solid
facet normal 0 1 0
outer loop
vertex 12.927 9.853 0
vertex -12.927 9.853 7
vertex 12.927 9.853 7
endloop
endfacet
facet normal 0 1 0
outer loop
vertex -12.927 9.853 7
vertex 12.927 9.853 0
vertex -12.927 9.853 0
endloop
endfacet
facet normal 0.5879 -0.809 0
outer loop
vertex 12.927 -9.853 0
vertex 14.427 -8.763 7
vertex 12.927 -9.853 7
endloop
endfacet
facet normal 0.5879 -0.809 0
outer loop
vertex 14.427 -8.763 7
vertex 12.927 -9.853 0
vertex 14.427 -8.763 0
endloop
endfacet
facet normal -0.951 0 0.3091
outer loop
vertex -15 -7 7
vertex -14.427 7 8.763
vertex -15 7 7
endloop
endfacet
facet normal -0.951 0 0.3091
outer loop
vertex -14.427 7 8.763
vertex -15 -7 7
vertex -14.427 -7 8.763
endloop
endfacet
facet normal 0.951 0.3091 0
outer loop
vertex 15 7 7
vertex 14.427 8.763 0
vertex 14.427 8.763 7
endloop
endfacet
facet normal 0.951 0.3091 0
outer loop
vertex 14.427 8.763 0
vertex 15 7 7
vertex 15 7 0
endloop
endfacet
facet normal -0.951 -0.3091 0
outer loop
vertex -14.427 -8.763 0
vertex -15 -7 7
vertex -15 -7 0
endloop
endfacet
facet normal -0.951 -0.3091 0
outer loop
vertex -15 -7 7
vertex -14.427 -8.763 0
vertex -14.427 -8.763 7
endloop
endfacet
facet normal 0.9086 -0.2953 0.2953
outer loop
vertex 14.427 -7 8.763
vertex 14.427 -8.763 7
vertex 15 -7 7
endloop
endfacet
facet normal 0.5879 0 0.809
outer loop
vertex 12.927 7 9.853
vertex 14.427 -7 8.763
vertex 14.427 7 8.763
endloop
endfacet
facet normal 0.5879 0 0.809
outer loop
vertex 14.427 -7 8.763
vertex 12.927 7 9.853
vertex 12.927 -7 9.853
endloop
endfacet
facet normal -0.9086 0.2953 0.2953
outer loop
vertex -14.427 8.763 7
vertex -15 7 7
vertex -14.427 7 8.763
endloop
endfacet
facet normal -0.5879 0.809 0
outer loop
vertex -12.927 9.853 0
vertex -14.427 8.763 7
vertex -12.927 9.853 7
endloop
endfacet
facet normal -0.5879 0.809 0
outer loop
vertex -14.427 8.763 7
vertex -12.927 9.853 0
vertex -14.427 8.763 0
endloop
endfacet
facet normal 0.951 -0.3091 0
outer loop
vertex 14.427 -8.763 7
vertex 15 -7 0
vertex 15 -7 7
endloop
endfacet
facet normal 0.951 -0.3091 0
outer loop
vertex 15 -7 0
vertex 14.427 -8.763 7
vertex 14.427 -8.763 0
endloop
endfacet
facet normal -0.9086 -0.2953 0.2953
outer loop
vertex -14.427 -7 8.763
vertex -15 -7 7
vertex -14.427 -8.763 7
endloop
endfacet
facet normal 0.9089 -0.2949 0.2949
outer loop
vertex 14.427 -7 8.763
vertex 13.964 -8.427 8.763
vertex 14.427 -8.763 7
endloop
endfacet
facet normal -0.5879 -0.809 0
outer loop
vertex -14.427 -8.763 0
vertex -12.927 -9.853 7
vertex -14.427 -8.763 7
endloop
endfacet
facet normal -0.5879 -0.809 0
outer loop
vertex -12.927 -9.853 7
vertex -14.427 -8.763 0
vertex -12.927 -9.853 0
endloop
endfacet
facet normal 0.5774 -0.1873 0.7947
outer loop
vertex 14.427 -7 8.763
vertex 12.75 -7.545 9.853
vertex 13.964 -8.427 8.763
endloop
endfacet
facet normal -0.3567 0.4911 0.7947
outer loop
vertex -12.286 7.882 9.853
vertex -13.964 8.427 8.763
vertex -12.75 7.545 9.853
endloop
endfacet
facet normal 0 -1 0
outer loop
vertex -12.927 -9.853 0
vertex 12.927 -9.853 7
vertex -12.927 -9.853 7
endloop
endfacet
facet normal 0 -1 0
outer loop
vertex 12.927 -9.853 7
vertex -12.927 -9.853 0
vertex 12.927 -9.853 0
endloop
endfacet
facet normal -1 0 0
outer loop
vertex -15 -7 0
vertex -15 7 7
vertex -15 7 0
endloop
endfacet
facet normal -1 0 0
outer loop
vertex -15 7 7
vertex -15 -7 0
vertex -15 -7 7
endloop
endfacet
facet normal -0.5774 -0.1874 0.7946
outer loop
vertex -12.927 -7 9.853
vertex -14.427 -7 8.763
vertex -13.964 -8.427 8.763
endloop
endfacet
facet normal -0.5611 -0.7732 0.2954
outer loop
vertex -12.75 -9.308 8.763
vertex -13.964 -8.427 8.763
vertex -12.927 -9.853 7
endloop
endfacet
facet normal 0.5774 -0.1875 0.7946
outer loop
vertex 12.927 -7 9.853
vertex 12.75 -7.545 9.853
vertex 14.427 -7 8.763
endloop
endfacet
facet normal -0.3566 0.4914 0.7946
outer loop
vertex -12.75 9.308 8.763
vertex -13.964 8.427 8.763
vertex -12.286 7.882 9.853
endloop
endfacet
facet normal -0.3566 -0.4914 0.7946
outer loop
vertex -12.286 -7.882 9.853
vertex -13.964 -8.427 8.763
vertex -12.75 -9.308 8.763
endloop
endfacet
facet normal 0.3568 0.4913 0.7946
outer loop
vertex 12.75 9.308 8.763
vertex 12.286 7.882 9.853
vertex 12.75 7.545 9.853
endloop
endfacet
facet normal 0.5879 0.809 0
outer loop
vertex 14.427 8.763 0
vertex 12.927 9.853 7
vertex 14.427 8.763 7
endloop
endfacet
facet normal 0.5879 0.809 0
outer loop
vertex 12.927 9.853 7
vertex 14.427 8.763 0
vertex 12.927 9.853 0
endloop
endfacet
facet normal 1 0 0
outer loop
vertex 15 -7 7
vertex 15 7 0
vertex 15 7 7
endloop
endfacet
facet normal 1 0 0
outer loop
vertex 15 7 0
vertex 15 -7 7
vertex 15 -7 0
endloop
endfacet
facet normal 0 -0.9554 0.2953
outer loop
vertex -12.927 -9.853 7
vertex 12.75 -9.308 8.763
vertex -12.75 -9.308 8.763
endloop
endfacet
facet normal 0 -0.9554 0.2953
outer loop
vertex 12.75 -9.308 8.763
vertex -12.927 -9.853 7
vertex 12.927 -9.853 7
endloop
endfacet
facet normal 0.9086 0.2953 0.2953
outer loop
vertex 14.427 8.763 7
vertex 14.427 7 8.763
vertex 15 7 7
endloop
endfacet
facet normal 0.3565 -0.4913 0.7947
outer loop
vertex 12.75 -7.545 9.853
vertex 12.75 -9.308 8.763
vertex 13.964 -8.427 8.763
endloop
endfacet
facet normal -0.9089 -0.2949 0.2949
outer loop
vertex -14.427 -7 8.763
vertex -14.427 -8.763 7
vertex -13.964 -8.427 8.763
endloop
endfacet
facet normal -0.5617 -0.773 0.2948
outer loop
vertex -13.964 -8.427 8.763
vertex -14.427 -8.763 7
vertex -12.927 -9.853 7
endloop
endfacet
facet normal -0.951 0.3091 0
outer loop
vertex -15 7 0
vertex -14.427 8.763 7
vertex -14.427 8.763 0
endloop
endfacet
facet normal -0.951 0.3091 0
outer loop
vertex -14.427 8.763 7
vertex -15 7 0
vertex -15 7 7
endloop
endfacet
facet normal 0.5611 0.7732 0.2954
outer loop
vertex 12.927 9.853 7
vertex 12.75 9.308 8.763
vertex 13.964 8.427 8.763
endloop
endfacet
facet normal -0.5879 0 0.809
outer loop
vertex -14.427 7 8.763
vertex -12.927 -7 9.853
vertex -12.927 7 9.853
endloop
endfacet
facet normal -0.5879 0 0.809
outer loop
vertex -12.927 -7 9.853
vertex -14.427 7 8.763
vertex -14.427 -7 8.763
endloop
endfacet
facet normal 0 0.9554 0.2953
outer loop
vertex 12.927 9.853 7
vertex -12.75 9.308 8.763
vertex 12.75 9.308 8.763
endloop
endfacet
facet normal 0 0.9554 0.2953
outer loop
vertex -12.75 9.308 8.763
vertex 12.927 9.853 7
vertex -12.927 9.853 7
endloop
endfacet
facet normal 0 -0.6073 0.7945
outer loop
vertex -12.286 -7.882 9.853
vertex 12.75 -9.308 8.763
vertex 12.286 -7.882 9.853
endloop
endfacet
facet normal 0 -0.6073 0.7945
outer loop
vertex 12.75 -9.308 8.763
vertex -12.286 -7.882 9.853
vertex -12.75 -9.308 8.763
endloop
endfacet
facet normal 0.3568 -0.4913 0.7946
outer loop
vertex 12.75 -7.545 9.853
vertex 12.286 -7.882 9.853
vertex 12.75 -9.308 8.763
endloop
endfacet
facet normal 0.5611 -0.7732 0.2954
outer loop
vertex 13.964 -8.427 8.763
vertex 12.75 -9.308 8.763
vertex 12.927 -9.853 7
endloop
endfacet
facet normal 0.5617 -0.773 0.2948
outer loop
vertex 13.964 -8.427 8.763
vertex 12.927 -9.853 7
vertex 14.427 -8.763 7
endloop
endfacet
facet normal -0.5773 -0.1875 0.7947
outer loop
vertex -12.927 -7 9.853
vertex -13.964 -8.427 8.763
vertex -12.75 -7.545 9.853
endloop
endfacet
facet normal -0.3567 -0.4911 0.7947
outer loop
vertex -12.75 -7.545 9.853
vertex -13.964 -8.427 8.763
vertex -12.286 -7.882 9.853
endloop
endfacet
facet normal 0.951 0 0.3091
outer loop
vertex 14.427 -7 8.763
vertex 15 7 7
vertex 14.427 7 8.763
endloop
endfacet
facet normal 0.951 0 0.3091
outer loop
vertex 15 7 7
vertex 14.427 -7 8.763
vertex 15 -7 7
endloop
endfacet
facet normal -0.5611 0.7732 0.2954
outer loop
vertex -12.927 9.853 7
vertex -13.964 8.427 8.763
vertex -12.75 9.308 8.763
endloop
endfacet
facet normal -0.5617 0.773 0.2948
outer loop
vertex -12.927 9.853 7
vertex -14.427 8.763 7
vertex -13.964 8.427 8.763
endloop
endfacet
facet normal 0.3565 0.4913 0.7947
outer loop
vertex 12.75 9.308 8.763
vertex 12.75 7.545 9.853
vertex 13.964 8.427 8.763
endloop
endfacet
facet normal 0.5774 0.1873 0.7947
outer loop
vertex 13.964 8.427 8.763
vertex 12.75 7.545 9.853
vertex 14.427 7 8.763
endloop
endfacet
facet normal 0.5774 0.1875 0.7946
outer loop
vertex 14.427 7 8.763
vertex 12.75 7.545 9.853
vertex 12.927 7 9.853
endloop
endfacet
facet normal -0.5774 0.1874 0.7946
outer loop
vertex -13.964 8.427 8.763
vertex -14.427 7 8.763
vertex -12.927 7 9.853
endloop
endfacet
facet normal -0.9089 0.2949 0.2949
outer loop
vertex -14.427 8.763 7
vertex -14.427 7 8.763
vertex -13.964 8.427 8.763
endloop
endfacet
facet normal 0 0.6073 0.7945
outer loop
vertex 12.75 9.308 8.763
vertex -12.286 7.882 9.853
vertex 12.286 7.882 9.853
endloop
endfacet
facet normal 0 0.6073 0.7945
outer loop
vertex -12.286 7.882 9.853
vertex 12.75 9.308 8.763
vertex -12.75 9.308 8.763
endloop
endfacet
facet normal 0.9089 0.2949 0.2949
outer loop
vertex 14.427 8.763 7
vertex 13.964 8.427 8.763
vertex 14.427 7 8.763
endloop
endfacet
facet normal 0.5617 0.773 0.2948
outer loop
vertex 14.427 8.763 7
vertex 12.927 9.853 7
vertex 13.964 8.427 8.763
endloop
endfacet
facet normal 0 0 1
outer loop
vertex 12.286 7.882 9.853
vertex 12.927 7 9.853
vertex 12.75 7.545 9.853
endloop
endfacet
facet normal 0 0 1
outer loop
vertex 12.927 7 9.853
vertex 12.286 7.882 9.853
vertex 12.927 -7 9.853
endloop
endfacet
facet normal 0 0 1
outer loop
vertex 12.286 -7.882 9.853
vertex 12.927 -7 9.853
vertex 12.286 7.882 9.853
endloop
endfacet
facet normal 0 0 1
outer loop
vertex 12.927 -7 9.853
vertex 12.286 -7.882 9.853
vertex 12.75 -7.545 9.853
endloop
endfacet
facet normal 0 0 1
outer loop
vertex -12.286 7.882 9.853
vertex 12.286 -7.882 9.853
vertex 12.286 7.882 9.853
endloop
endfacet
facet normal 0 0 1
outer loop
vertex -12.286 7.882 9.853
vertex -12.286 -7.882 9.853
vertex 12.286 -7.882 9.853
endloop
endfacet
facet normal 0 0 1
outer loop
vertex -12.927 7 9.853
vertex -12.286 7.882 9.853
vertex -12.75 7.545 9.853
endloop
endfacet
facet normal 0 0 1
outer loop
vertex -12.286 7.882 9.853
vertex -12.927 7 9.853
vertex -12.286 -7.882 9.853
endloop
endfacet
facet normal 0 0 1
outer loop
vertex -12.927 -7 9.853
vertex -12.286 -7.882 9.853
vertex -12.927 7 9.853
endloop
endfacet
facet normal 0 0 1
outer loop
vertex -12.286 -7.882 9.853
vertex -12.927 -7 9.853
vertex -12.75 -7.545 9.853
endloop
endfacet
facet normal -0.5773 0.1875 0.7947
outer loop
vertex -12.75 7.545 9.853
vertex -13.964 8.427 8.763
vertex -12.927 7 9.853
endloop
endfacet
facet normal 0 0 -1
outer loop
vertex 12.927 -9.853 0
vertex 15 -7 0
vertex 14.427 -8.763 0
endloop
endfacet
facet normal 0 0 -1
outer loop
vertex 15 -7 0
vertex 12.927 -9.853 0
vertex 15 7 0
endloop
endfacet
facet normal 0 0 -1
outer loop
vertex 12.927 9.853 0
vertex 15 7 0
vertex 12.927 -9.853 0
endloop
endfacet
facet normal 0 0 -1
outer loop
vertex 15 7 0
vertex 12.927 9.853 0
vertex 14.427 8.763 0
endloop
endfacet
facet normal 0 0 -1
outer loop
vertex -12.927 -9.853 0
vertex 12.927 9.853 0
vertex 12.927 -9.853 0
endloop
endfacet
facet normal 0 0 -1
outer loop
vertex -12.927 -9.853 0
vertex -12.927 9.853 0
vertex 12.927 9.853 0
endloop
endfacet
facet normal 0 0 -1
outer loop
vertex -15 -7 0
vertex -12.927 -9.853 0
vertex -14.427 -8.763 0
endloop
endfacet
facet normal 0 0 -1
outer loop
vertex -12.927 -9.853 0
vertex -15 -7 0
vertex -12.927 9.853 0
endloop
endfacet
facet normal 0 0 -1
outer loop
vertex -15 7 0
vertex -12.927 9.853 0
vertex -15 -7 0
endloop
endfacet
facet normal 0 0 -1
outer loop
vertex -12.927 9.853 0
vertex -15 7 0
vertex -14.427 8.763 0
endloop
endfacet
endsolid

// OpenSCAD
// Example:
roundedCube(
  x = 30,
  y = 20,
  z = 10,
  r = 3,
  flatBottom = true,
  centerX = true,
  centerY = true
);

module roundedCube(
  x,
  y,
  z,
  r = 0,
  flatTop = false,
  flatBottom = false,
  flatLeft = false,
  flatRight = false,
  flatFront = false,
  flatBack = false,
  centerX = false,
  centerY = false,
  centerZ = false
) {
  // Calculate [ x, y, z ] compensations based on requested flattenings:
  rX = r * (flatLeft && flatRight ? 0 : (flatLeft || flatRight ? 1 : 2));
  rY = r * (flatFront && flatBack ? 0 : (flatFront || flatBack ? 1 : 2));
  rZ = r * (flatTop && flatBottom ? 0 : (flatTop || flatBottom ? 1 : 2));

  // Do some sanity checks:
  assert(x - rX >= 0, "roundedCube() is too small along its x-axis");
  assert(y - rY >= 0, "roundedCube() is too small along its y-axis");
  assert(z - rZ >= 0, "roundedCube() is too small along its z-axis");

  translate([ centerX ? x / -2 : 0, centerY ? y / -2 : 0, centerZ ? z / -2 : 0 ])
  if (r == 0) {
    // If there's no rounding, it's just a regular cube:
    cube([ x, y, z ]);
  } else {
    difference() {
      // Main rounded cube:
      translate([
        flatLeft ? 0 : r,
        flatFront ? 0 : r,
        flatBottom ? 0 : r
      ])
      hull() {
        for (i = [ 0, z - rZ ]) {
          translate([ 0, 0, i ]) sphere(r = r);
          translate([ x - rX, 0, i ]) sphere(r = r);
          translate([ 0, y - rY, i ]) sphere(r = r);
          translate([ x - rX, y - rY, i ]) sphere(r = r);
        }
      }

      // Optional cutouts:
      if (flatTop) {
        translate([ x / -2, y / -2, z ])
        cube([ x * 2, y * 2, r ]);
      }
      if (flatBottom) {
        translate([ x / -2, y / -2, -r ])
        cube([ x * 2, y * 2, r ]);
      }
      if (flatLeft) {
        translate([ -r, y / -2, z / -2 ])
        cube([ r, y * 2, z * 2 ]);
      }
      if (flatRight) {
        translate([ x, y / -2, z / -2 ])
        cube([ r, y * 2, z * 2 ]);
      }
      if (flatFront) {
        translate([ x / -2, -r, z / -2 ])
        cube([ x * 2, r, z * 2 ]);
      }
      if (flatBack) {
        translate([ x / -2, y, z / -2 ])
        cube([ x * 2, r, z * 2 ]);
      }
    }
  }
}
